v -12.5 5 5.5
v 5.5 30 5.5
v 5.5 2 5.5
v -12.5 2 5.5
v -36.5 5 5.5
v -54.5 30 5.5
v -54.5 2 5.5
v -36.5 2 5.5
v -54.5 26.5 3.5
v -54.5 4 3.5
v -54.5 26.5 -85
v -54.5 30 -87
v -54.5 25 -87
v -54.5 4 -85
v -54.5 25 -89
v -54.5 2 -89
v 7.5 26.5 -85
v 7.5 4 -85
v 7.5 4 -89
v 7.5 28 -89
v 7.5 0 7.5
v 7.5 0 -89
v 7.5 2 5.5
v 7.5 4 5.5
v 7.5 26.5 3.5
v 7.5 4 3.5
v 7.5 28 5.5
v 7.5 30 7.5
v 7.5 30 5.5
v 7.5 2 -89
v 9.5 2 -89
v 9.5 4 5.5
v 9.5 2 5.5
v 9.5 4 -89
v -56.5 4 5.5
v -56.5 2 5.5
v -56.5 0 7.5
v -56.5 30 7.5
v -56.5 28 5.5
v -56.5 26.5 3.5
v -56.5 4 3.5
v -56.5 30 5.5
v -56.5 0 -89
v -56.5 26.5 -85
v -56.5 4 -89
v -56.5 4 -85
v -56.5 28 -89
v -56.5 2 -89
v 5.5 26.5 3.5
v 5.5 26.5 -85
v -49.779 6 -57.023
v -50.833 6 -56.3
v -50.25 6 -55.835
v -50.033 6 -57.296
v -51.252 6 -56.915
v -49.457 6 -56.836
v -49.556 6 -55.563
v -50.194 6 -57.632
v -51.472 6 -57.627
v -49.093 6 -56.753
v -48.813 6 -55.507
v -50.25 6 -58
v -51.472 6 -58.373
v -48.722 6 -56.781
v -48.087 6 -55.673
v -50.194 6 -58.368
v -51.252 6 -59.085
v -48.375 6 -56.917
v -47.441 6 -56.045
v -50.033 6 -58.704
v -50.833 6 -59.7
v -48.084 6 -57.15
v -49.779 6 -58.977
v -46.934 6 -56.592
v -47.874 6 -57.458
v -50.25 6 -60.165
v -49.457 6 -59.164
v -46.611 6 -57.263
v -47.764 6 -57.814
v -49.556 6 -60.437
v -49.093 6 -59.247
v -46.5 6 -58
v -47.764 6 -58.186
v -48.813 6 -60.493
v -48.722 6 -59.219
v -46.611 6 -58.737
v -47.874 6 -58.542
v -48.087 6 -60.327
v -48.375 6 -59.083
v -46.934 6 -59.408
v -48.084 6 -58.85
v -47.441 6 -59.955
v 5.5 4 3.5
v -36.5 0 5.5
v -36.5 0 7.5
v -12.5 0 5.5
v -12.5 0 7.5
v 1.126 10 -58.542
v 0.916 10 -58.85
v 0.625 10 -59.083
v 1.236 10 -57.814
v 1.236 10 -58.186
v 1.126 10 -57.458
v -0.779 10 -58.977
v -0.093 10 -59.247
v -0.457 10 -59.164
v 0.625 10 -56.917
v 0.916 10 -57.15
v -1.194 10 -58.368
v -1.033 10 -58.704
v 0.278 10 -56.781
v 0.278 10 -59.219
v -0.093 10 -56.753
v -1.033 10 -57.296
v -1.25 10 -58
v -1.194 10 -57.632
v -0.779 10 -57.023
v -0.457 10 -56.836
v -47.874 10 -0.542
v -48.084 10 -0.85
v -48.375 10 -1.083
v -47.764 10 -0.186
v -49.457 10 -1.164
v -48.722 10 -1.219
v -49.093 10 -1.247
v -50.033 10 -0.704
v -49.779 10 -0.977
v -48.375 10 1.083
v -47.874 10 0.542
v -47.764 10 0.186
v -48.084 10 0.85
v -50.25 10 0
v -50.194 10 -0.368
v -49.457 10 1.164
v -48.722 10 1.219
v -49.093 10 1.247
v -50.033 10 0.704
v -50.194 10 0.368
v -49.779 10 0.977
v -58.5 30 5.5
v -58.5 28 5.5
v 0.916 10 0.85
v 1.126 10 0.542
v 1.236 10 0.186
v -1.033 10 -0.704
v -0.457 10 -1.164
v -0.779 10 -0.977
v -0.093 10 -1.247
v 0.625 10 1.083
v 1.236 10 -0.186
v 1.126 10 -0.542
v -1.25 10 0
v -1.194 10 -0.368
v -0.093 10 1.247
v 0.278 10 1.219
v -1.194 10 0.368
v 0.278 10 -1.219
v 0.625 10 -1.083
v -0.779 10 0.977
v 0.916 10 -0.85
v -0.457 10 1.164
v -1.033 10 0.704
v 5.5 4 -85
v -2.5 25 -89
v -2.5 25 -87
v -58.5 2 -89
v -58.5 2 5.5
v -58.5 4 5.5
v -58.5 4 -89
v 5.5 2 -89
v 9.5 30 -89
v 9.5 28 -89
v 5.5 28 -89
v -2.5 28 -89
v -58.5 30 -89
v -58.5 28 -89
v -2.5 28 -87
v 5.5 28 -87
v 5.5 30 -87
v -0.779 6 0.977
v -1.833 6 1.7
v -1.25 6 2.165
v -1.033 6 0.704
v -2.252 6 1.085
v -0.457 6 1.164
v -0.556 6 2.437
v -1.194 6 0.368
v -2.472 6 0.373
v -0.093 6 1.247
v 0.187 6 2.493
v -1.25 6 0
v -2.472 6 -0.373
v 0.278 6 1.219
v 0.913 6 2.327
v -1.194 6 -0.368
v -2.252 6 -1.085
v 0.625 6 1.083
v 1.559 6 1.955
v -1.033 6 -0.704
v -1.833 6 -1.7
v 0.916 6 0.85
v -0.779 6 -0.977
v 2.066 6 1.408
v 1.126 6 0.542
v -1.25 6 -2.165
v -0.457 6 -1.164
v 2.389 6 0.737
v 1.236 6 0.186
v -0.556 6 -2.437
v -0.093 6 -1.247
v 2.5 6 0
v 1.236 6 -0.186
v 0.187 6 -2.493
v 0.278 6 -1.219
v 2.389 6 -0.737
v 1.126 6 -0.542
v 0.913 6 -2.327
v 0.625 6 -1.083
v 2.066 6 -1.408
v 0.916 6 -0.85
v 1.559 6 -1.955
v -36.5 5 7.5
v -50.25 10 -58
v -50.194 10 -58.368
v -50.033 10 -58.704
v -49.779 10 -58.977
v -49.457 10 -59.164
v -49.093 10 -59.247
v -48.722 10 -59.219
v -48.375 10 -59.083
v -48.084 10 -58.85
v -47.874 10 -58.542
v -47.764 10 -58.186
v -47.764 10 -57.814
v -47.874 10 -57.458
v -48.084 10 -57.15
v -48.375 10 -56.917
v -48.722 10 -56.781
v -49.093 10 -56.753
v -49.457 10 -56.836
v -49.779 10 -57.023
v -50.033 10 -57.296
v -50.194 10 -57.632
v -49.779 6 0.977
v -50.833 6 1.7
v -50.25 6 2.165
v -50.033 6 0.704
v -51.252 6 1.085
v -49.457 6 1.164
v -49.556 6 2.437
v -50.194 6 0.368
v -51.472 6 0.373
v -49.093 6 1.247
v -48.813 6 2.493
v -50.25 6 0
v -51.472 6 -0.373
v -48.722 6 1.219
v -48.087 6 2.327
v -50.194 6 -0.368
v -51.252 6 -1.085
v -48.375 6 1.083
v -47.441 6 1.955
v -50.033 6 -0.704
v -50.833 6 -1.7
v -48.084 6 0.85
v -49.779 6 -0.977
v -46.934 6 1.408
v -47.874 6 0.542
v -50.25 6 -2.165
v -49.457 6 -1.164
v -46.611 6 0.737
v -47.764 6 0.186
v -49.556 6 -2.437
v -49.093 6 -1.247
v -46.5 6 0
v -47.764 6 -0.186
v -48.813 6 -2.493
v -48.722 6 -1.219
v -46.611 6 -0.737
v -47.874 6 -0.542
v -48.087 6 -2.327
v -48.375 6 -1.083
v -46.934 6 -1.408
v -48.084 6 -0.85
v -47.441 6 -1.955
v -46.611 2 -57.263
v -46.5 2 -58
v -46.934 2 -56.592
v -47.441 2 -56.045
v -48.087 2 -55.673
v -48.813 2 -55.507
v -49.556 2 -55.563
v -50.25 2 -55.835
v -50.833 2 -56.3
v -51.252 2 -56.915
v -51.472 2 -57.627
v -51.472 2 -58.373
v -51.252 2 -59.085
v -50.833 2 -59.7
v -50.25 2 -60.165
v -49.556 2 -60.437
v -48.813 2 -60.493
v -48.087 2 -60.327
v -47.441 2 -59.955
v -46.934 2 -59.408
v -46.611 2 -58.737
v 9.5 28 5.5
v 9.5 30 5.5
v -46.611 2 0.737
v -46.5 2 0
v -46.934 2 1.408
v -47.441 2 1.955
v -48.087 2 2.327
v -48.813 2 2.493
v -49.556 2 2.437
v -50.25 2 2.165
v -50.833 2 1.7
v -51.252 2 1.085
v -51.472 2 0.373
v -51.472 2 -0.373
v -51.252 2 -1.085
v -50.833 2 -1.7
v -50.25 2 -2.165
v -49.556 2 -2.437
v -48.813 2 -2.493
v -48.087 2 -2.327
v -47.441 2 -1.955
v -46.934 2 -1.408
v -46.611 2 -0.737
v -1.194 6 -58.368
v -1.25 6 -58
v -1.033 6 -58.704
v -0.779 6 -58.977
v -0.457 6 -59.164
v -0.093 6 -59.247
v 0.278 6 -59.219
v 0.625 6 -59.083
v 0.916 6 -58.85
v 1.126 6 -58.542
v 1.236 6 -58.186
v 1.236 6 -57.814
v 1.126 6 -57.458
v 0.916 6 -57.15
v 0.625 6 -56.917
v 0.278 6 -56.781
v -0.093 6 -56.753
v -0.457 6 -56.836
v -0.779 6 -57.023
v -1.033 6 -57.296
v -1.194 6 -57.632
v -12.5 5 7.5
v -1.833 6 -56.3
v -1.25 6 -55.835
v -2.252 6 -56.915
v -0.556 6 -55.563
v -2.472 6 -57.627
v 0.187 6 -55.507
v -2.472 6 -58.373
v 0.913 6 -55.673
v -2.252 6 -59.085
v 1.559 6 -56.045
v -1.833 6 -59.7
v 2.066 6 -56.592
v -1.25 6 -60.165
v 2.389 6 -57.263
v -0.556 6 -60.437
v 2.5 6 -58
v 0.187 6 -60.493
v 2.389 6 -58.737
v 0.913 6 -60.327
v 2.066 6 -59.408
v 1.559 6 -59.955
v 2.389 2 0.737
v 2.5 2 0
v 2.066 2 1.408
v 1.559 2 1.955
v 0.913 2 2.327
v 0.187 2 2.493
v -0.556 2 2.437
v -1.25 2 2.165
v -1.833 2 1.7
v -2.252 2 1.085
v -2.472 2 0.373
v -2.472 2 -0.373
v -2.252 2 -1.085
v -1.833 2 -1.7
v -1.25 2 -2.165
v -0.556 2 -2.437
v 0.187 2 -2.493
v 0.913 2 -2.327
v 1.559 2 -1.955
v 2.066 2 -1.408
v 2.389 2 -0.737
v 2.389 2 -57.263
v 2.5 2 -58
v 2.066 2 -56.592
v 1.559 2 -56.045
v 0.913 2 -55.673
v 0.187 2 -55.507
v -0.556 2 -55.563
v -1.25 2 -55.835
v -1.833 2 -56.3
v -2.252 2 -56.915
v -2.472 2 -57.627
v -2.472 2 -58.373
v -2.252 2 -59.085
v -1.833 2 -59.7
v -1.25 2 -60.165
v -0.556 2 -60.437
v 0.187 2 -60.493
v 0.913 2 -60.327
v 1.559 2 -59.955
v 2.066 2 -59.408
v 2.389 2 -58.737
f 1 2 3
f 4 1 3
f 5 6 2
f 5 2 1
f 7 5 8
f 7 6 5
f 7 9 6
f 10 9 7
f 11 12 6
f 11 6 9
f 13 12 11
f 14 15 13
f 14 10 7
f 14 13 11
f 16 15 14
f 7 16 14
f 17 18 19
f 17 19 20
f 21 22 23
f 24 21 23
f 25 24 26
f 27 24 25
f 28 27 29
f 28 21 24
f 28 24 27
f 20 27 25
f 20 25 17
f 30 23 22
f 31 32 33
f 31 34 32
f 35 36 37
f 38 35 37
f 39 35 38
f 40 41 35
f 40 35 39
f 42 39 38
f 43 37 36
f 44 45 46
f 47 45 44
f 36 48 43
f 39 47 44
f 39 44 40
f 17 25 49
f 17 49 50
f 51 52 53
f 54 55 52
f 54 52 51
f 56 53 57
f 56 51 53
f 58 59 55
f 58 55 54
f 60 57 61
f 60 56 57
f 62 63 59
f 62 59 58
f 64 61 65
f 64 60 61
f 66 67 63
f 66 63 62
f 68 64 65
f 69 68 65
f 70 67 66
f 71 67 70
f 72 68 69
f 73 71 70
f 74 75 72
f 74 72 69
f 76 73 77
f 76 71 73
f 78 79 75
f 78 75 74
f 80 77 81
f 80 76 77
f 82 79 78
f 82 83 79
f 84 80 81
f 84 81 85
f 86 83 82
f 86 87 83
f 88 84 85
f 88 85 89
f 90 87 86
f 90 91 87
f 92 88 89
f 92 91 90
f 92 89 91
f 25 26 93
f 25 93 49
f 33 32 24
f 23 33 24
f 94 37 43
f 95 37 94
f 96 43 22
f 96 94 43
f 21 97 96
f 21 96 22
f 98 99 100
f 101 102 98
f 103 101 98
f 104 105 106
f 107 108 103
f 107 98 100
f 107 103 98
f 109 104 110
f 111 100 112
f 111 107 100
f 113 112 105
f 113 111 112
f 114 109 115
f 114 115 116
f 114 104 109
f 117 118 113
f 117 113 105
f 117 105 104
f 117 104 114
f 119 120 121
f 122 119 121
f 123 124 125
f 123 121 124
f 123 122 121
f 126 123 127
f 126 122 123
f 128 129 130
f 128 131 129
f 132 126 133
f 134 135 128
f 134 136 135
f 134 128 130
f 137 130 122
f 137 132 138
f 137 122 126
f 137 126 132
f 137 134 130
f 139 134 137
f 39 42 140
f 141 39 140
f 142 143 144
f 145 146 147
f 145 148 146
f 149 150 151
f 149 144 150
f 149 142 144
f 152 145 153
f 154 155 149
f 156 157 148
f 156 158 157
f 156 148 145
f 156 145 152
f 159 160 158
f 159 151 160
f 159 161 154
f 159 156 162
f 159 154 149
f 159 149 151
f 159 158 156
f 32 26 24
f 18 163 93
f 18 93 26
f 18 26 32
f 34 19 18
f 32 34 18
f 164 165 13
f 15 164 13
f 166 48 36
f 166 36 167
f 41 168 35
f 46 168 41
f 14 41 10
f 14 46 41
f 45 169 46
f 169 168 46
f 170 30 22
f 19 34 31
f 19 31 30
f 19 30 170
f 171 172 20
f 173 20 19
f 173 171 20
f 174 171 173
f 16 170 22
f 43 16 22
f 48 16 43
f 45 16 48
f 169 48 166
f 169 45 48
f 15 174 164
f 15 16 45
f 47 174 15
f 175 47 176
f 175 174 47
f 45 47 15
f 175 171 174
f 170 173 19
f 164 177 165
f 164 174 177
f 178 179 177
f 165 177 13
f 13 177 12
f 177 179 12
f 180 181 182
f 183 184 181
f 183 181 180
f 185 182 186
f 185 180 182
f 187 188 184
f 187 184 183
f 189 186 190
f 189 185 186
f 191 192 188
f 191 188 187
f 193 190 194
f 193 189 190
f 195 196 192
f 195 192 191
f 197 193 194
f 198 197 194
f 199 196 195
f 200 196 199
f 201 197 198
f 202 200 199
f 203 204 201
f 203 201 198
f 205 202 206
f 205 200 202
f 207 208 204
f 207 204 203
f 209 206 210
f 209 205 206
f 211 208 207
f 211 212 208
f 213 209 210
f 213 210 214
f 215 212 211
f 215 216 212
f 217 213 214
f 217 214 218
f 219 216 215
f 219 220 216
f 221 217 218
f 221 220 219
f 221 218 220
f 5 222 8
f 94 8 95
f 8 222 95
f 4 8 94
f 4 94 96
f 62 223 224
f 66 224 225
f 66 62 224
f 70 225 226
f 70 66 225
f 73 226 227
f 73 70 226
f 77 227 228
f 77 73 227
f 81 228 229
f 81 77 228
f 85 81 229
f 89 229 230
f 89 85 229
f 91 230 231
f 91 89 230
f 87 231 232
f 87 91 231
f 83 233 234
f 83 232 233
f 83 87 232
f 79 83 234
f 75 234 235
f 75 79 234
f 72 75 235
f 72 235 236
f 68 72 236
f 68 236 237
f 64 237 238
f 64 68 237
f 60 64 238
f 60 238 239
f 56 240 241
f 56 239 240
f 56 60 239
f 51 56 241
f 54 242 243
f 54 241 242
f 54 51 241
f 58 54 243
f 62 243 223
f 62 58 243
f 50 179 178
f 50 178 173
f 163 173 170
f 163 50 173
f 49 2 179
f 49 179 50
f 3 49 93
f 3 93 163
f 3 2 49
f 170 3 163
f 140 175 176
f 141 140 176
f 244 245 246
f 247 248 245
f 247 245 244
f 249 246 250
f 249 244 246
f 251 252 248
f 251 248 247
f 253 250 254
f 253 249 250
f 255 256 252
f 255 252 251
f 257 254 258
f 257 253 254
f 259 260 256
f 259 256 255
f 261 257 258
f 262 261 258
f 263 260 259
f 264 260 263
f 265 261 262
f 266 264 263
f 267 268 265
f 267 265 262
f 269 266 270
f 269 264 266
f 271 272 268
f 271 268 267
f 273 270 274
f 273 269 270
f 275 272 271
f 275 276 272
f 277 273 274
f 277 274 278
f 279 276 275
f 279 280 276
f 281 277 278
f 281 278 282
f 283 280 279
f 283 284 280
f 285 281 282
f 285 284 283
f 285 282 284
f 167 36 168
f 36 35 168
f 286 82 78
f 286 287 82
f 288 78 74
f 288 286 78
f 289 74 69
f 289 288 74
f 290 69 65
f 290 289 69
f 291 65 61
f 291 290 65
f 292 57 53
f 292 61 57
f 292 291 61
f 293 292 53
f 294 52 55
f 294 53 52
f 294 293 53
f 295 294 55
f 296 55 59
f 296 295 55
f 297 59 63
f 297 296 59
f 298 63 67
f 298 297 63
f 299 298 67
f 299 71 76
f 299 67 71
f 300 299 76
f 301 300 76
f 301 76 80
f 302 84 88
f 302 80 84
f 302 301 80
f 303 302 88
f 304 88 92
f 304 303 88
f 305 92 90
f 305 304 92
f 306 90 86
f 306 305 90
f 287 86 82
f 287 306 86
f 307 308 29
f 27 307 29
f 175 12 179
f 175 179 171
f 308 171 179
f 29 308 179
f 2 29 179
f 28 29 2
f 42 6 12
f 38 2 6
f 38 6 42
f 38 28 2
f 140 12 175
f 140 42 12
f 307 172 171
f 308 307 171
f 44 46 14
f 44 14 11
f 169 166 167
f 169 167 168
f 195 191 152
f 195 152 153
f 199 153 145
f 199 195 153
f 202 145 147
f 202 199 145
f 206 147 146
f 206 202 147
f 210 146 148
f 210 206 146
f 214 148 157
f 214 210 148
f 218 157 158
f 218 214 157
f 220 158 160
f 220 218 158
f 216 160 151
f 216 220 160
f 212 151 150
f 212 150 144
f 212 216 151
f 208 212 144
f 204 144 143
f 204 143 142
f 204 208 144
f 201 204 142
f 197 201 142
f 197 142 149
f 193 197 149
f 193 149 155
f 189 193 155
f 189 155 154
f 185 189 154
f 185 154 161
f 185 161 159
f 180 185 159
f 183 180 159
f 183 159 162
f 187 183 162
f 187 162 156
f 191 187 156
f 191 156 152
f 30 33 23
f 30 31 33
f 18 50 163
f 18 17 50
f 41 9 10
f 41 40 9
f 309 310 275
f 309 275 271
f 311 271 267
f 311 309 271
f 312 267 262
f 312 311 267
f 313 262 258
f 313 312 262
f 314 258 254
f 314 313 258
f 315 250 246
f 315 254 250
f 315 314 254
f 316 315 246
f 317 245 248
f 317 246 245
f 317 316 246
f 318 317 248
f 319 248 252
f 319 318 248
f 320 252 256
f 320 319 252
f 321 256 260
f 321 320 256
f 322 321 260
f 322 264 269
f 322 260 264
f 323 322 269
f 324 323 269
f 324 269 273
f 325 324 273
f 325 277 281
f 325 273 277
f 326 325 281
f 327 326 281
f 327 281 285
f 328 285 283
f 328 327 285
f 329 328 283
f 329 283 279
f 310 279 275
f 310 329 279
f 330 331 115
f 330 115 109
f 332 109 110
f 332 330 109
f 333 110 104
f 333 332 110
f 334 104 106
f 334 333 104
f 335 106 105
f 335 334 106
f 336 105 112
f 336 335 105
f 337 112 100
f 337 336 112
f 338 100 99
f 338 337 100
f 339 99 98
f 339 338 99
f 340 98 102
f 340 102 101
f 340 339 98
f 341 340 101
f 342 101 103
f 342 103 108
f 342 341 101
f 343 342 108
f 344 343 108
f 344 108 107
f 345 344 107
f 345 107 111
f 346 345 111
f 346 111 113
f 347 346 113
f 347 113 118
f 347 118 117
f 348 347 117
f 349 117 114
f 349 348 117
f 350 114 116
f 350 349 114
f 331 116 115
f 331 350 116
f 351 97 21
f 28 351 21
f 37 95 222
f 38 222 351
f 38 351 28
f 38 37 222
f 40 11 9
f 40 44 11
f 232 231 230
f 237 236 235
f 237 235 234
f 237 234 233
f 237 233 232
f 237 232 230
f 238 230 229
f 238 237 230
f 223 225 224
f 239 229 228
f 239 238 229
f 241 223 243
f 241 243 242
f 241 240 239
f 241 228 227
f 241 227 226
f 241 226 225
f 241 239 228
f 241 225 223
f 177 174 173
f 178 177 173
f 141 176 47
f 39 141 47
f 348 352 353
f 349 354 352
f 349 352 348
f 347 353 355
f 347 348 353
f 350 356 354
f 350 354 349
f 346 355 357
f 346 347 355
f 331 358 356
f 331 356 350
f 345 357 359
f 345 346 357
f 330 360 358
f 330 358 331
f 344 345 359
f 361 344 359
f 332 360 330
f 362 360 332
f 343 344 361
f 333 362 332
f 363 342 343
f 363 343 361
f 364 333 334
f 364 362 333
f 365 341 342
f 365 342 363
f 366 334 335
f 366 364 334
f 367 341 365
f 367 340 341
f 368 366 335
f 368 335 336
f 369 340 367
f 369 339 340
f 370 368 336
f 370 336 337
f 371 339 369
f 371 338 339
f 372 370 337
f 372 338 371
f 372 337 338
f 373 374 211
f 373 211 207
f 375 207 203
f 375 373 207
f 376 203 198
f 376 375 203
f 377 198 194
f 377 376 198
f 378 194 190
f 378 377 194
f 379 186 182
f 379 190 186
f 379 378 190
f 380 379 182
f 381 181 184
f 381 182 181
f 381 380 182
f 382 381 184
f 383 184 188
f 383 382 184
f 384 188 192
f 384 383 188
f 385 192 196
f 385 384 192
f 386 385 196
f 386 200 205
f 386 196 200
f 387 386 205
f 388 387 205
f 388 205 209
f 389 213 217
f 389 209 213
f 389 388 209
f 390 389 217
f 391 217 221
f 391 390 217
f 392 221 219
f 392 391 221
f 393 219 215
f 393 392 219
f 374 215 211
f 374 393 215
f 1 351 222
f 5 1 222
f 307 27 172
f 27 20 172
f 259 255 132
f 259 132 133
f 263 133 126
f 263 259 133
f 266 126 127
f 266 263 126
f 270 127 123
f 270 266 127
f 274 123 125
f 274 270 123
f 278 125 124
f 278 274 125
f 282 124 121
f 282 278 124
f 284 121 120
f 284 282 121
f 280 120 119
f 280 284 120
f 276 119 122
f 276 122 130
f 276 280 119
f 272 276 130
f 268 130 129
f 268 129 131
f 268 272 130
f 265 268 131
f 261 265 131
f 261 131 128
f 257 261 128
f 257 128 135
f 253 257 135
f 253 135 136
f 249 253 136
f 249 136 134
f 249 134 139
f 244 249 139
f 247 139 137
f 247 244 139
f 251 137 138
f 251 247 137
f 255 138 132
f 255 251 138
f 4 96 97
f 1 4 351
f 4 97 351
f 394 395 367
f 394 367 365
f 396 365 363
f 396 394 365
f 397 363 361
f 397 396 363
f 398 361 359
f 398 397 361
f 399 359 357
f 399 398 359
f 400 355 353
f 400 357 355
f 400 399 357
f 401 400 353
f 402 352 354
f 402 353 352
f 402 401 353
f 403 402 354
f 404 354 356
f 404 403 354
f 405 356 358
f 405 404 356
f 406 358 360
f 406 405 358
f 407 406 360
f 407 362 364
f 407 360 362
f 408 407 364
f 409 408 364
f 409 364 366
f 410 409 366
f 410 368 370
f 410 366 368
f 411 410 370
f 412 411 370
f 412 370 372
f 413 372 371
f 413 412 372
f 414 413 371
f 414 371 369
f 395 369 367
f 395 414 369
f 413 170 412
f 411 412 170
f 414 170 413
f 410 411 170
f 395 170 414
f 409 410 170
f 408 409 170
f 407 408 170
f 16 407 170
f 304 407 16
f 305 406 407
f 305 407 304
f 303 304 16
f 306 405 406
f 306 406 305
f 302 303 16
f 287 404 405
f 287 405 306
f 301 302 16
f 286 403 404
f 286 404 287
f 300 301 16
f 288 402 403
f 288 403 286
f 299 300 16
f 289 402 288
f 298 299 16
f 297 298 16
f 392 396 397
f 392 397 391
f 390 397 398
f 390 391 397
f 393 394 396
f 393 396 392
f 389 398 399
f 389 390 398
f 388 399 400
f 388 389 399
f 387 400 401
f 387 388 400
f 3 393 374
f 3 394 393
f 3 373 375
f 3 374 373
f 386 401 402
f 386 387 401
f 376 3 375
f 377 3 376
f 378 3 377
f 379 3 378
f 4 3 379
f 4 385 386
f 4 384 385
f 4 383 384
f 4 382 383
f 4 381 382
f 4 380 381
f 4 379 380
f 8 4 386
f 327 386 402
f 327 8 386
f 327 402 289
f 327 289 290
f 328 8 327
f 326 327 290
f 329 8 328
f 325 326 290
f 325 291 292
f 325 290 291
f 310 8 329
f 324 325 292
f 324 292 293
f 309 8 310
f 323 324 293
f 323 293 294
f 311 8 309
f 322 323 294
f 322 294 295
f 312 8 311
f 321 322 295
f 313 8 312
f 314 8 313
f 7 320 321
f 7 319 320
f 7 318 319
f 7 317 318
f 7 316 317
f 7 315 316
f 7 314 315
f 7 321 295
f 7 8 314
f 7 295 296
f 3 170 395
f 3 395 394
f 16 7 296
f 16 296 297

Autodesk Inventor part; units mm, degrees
sketch "Sketch1" plane through (0, 0, 0) normal (0, 1, 0) x (-1, 0, 0)
  point P0 (0, 0)
sketch "Sketch2" plane through (0, 0, 0) normal (0, 1, 0) x (-1, 0, 0)
  circle A0 centre (0, 0) radius 1.25
  line L0 (60.55, 0) -> (-11.55, 0) projected
  line L1 (0, -71.35) -> (0, 13.35) projected
  circle A1 centre (49, 0) radius 1.25
  circle A2 centre (0, -58) radius 1.25
  circle A3 centre (49, -58) radius 1.25
  dimension "d0" = 2.5
  dimension "d3" = 49
  dimension "d6" = 58
extrude "Extrusion1" add sketch "Sketch2" along normal blind 10
sketch "Sketch3" plane through (0, 0, 0) normal (0, 1, 0) x (-1, 0, 0)
  line L0 (52.5, 3.5) -> (-3.5, 3.5)
  line L1 (-3.5, 3.5) -> (-3.5, -85)
  line L2 (-3.5, -85) -> (52.5, -85)
  line L3 (52.5, -85) -> (52.5, 3.5)
  circle A0 centre (49, 0) radius 1.25 projected
  circle A1 centre (49, -58) radius 1.25 projected
  circle A2 centre (0, 0) radius 1.25 projected
  circle A3 centre (0, -58) radius 1.25 projected
  line L4 (54.5, 5.5) -> (-5.5, 5.5)
  line L5 (-5.5, 5.5) -> (-5.5, -87)
  line L6 (-5.5, -87) -> (54.5, -87)
  line L7 (54.5, -87) -> (54.5, 5.5)
  dimension "d11" = 3.5
  dimension "d12" = 27
  dimension "d13" = 3.5
  dimension "d14" = 3.5
  dimension "d15" = 2
extrude "Extrusion2" add sketch "Sketch3" along normal blind 2 contours L3 L2 L1 L0 | L7 L6 L5 L4
sketch "Sketch4" plane through (0, 2, 0) normal (0, 1, 0) x (1, 0, 0)
  line L0 (-54.5, 87) -> (-54.5, -5.5) projected
  line L1 (-54.5, -5.5) -> (5.5, -5.5) projected
  line L2 (5.5, 87) -> (-54.5, 87) projected
  line L3 (5.5, -5.5) -> (5.5, 87) projected
  point P0 (0, 0)
sketch "Sketch5" plane through (0, 0, 0) normal (0, 0, 1) x (1, 0, 0)
  line L0 (-54.5, 0) -> (5.5, 0) projected
  line L1 (5.5, 0) -> (5.5, 2) projected
  line L2 (-54.5, 2) -> (5.5, 2) projected
  line L3 (-54.5, 0) -> (-54.5, 2) projected
  line L4 (5.5, 0) -> (7.5, 0)
  line L5 (7.5, 0) -> (7.5, 30)
  line L6 (7.5, 30) -> (5.5, 30)
  line L7 (5.5, 30) -> (5.5, 0)
  point P0 (0, 0)
  dimension "d18" = 2
  dimension "d19" = 30
sketch3d "3D Sketch1"
sketch3d "3D Sketch2"
  line L0 (5.5, 2, -87) -> (5.5, 2, 5.5)
  line L1 (5.5, 2, 5.5) -> (-54.5, 2, 5.5)
  line L2 (-54.5, 2, 5.5) -> (-54.5, 2, -87)
sweep "Sweep2" add profiles "Sketch5" path "3D Sketch2" contours L1 L7 L6 L5 L4
sketch "Sketch6" plane through (7.5, 0, -87) normal (0, 0, -1) x (-1, 0, 0)
  line L0 (2, 30) -> (62, 30)
  line L1 (2, 30) -> (2, 2) projected
  line L2 (2, 25) -> (62, 25)
  line L3 (62, 30) -> (62, 2) projected
  line L4 (2, 25) -> (2, 2)
  line L5 (2, 2) -> (62, 2)
  line L6 (2, 2) -> (62, 2) projected
  line L7 (62, 25) -> (62, 2)
  line L8 (0, 0) -> (0, 30) projected
  line L9 (0, 30) -> (2, 30) projected
  line L10 (64, 0) -> (0, 0) projected
  line L11 (64, 0) -> (64, 30) projected
  line L12 (64, 30) -> (62, 30) projected
  point P0 (7.5, 0)
  dimension "d25" = 5
extrude "Extrusion3" add sketch "Sketch6" along normal blind 2 contours L0 L3 L2 L1 | L1 L5 L3 L12 L11 L10 L8 L9
sketch "Sketch8" plane through (-56.5, 30, 7.5) normal (0, 0, 1) x (1, 0, 0)
  line L0 (64, -30) -> (0, -30) projected
  line L1 (20, -30) -> (44, -30)
  line L2 (44, -30) -> (44, -25)
  line L3 (44, -25) -> (20, -25)
  line L4 (20, -25) -> (20, -30)
  line L5 (0, -30) -> (0, 0) projected
  line L6 (64, -30) -> (64, 0) projected
  point P0 (56.5, -30)
  dimension "d39" = 20
  dimension "d40" = 20
  dimension "d41" = 5
extrude "Extrusion5" cut sketch "Sketch8" against normal blind 2
sketch "Sketch9" plane through (0, 2, 0) normal (0, 1, 0) x (1, 0, 0)
  circle A0 centre (0, 0) radius 1.25 projected
  circle A1 centre (0, 0) radius 1.25 projected
  circle A2 centre (-49, 0) radius 1.25 projected
  circle A3 centre (-49, 0) radius 1.25 projected
  circle A4 centre (-49, 58) radius 1.25 projected
  circle A5 centre (-49, 58) radius 1.25 projected
  circle A6 centre (0, 58) radius 1.25 projected
  circle A7 centre (0, 58) radius 1.25 projected
  circle A8 centre (0, 58) radius 1.25 projected
  circle A9 centre (0, 0) radius 2.5
  circle A10 centre (-49, 0) radius 1.25 projected
  circle A11 centre (-49, 0) radius 2.5
  circle A12 centre (0, 58) radius 2.5
  circle A13 centre (-49, 58) radius 2.5
  dimension "d44" = 5
  dimension "d45" = 5
  dimension "d46" = 5
  dimension "d47" = 5
extrude "Extrusion6" add sketch "Sketch9" along normal blind 4
sketch "Sketch12" plane through (7.5, 0, -89) normal (0, 0, -1) x (-1, 0, 0)
  line L0 (10, 6) -> (5, 6) projected
  line L1 (5, 2) -> (10, 2) projected
  line L2 (10, 6) -> (5, 6) projected
  line L3 (2, 30) -> (10, 30)
  line L4 (10, 30) -> (10, 28)
  line L5 (10, 28) -> (2, 28)
  line L6 (2, 28) -> (2, 30)
  line L7 (2, 25) -> (62, 25) projected
  line L8 (2, 28) -> (10, 28)
  line L9 (10, 28) -> (10, 25)
  line L10 (10, 25) -> (2, 25)
  line L11 (2, 25) -> (2, 28)
  point P0 (7.5, 0)
  dimension "d72" = 8
  dimension "d73" = 2
sketch "Sketch13" plane through (7.5, 0, 7.5) normal (1, 0, 0) x (0, 0, -1)
  line L0 (2, 5) -> (2, 2) projected
  line L1 (2, 30) -> (2, 2) projected
  line L2 (2, 30) -> (2, 2) projected
  line L3 (2, 2) -> (2, 5) projected
  line L4 (63, 2) -> (68, 2) projected
  line L5 (5, 2) -> (10, 2) projected
  line L6 (5, 2) -> (10, 2) projected
  line L7 (63, 2) -> (68, 2) projected
  line L8 (2, 2) -> (96.5, 2) projected
  line L9 (96.5, 2) -> (2, 2) projected
  line L10 (94.5, 25) -> (94.5, 30) projected
  line L11 (96.5, 25) -> (96.5, 2) projected
  line L12 (4, 26.5) -> (92.5, 26.5)
  line L13 (92.5, 26.5) -> (92.5, 4)
  line L14 (92.5, 4) -> (4, 4)
  line L15 (4, 4) -> (4, 26.5)
  line L16 (96.5, 30) -> (0, 30) projected
  line L17 (96.5, 2) -> (96.5, 25) projected
  point P0 (7.5, 0)
  dimension "d67" = 2
  dimension "d68" = 2
  dimension "d69" = 3.5
  dimension "d70" = 2
extrude "Extrusion10" cut sketch "Sketch12" against normal up to surface (2 mm away) contours L5 L9 L7 L11
extrude "Extrusion11" cut sketch "Sketch13" against normal up to surface (2 mm away)
sketch "Sketch14" plane through (7.5, 0, -89) normal (0, 0, -1) x (-1, 0, 0)
  line L0 (64, 30) -> (66, 30)
  line L1 (66, 30) -> (66, 28)
  line L2 (66, 28) -> (64, 28)
  line L3 (64, 28) -> (64, 30)
  line L4 (66, 4) -> (64, 4)
  line L5 (64, 4) -> (64, 2)
  line L6 (64, 2) -> (66, 2)
  line L7 (66, 2) -> (66, 4)
  line L8 (64, 30) -> (0, 30) projected
  line L9 (64, 0) -> (64, 30) projected
  point P0 (7.5, 0)
  dimension "d78" = 2
  dimension "d79" = 2
  dimension "d80" = 2
  dimension "d81" = 2
  dimension "d82" = 0
  dimension "d83" = 0
  dimension "d84" = 0
  dimension "d85" = 24
extrude "Extrusion12" add sketch "Sketch14" against normal blind 94.5
ref_plane "Work Plane1" through (-24.5, 0, 7.5) normal (-1, 0, 0) x (0, 0, 1)
mirror "Mirror1" about plane through (-24.5, 0, 7.5) normal (-1, 0, 0) of "Extrusion12"
sketch "Sketch15" plane through (-56.5, 0, 7.5) normal (-1, 0, 0) x (0, 0, 1)
  line L0 (-4, 4) -> (-92.5, 4) projected
  line L1 (-92.5, 26.5) -> (-4, 26.5) projected
  line L2 (-4, 26.5) -> (-4, 4) projected
  line L3 (-92.5, 4) -> (-92.5, 26.5) projected
  point P0 (-7.5, 0)
extrude "Extrusion13" cut sketch "Sketch15" against normal blind 2
properties part number "PI_Skal_med_rals"
